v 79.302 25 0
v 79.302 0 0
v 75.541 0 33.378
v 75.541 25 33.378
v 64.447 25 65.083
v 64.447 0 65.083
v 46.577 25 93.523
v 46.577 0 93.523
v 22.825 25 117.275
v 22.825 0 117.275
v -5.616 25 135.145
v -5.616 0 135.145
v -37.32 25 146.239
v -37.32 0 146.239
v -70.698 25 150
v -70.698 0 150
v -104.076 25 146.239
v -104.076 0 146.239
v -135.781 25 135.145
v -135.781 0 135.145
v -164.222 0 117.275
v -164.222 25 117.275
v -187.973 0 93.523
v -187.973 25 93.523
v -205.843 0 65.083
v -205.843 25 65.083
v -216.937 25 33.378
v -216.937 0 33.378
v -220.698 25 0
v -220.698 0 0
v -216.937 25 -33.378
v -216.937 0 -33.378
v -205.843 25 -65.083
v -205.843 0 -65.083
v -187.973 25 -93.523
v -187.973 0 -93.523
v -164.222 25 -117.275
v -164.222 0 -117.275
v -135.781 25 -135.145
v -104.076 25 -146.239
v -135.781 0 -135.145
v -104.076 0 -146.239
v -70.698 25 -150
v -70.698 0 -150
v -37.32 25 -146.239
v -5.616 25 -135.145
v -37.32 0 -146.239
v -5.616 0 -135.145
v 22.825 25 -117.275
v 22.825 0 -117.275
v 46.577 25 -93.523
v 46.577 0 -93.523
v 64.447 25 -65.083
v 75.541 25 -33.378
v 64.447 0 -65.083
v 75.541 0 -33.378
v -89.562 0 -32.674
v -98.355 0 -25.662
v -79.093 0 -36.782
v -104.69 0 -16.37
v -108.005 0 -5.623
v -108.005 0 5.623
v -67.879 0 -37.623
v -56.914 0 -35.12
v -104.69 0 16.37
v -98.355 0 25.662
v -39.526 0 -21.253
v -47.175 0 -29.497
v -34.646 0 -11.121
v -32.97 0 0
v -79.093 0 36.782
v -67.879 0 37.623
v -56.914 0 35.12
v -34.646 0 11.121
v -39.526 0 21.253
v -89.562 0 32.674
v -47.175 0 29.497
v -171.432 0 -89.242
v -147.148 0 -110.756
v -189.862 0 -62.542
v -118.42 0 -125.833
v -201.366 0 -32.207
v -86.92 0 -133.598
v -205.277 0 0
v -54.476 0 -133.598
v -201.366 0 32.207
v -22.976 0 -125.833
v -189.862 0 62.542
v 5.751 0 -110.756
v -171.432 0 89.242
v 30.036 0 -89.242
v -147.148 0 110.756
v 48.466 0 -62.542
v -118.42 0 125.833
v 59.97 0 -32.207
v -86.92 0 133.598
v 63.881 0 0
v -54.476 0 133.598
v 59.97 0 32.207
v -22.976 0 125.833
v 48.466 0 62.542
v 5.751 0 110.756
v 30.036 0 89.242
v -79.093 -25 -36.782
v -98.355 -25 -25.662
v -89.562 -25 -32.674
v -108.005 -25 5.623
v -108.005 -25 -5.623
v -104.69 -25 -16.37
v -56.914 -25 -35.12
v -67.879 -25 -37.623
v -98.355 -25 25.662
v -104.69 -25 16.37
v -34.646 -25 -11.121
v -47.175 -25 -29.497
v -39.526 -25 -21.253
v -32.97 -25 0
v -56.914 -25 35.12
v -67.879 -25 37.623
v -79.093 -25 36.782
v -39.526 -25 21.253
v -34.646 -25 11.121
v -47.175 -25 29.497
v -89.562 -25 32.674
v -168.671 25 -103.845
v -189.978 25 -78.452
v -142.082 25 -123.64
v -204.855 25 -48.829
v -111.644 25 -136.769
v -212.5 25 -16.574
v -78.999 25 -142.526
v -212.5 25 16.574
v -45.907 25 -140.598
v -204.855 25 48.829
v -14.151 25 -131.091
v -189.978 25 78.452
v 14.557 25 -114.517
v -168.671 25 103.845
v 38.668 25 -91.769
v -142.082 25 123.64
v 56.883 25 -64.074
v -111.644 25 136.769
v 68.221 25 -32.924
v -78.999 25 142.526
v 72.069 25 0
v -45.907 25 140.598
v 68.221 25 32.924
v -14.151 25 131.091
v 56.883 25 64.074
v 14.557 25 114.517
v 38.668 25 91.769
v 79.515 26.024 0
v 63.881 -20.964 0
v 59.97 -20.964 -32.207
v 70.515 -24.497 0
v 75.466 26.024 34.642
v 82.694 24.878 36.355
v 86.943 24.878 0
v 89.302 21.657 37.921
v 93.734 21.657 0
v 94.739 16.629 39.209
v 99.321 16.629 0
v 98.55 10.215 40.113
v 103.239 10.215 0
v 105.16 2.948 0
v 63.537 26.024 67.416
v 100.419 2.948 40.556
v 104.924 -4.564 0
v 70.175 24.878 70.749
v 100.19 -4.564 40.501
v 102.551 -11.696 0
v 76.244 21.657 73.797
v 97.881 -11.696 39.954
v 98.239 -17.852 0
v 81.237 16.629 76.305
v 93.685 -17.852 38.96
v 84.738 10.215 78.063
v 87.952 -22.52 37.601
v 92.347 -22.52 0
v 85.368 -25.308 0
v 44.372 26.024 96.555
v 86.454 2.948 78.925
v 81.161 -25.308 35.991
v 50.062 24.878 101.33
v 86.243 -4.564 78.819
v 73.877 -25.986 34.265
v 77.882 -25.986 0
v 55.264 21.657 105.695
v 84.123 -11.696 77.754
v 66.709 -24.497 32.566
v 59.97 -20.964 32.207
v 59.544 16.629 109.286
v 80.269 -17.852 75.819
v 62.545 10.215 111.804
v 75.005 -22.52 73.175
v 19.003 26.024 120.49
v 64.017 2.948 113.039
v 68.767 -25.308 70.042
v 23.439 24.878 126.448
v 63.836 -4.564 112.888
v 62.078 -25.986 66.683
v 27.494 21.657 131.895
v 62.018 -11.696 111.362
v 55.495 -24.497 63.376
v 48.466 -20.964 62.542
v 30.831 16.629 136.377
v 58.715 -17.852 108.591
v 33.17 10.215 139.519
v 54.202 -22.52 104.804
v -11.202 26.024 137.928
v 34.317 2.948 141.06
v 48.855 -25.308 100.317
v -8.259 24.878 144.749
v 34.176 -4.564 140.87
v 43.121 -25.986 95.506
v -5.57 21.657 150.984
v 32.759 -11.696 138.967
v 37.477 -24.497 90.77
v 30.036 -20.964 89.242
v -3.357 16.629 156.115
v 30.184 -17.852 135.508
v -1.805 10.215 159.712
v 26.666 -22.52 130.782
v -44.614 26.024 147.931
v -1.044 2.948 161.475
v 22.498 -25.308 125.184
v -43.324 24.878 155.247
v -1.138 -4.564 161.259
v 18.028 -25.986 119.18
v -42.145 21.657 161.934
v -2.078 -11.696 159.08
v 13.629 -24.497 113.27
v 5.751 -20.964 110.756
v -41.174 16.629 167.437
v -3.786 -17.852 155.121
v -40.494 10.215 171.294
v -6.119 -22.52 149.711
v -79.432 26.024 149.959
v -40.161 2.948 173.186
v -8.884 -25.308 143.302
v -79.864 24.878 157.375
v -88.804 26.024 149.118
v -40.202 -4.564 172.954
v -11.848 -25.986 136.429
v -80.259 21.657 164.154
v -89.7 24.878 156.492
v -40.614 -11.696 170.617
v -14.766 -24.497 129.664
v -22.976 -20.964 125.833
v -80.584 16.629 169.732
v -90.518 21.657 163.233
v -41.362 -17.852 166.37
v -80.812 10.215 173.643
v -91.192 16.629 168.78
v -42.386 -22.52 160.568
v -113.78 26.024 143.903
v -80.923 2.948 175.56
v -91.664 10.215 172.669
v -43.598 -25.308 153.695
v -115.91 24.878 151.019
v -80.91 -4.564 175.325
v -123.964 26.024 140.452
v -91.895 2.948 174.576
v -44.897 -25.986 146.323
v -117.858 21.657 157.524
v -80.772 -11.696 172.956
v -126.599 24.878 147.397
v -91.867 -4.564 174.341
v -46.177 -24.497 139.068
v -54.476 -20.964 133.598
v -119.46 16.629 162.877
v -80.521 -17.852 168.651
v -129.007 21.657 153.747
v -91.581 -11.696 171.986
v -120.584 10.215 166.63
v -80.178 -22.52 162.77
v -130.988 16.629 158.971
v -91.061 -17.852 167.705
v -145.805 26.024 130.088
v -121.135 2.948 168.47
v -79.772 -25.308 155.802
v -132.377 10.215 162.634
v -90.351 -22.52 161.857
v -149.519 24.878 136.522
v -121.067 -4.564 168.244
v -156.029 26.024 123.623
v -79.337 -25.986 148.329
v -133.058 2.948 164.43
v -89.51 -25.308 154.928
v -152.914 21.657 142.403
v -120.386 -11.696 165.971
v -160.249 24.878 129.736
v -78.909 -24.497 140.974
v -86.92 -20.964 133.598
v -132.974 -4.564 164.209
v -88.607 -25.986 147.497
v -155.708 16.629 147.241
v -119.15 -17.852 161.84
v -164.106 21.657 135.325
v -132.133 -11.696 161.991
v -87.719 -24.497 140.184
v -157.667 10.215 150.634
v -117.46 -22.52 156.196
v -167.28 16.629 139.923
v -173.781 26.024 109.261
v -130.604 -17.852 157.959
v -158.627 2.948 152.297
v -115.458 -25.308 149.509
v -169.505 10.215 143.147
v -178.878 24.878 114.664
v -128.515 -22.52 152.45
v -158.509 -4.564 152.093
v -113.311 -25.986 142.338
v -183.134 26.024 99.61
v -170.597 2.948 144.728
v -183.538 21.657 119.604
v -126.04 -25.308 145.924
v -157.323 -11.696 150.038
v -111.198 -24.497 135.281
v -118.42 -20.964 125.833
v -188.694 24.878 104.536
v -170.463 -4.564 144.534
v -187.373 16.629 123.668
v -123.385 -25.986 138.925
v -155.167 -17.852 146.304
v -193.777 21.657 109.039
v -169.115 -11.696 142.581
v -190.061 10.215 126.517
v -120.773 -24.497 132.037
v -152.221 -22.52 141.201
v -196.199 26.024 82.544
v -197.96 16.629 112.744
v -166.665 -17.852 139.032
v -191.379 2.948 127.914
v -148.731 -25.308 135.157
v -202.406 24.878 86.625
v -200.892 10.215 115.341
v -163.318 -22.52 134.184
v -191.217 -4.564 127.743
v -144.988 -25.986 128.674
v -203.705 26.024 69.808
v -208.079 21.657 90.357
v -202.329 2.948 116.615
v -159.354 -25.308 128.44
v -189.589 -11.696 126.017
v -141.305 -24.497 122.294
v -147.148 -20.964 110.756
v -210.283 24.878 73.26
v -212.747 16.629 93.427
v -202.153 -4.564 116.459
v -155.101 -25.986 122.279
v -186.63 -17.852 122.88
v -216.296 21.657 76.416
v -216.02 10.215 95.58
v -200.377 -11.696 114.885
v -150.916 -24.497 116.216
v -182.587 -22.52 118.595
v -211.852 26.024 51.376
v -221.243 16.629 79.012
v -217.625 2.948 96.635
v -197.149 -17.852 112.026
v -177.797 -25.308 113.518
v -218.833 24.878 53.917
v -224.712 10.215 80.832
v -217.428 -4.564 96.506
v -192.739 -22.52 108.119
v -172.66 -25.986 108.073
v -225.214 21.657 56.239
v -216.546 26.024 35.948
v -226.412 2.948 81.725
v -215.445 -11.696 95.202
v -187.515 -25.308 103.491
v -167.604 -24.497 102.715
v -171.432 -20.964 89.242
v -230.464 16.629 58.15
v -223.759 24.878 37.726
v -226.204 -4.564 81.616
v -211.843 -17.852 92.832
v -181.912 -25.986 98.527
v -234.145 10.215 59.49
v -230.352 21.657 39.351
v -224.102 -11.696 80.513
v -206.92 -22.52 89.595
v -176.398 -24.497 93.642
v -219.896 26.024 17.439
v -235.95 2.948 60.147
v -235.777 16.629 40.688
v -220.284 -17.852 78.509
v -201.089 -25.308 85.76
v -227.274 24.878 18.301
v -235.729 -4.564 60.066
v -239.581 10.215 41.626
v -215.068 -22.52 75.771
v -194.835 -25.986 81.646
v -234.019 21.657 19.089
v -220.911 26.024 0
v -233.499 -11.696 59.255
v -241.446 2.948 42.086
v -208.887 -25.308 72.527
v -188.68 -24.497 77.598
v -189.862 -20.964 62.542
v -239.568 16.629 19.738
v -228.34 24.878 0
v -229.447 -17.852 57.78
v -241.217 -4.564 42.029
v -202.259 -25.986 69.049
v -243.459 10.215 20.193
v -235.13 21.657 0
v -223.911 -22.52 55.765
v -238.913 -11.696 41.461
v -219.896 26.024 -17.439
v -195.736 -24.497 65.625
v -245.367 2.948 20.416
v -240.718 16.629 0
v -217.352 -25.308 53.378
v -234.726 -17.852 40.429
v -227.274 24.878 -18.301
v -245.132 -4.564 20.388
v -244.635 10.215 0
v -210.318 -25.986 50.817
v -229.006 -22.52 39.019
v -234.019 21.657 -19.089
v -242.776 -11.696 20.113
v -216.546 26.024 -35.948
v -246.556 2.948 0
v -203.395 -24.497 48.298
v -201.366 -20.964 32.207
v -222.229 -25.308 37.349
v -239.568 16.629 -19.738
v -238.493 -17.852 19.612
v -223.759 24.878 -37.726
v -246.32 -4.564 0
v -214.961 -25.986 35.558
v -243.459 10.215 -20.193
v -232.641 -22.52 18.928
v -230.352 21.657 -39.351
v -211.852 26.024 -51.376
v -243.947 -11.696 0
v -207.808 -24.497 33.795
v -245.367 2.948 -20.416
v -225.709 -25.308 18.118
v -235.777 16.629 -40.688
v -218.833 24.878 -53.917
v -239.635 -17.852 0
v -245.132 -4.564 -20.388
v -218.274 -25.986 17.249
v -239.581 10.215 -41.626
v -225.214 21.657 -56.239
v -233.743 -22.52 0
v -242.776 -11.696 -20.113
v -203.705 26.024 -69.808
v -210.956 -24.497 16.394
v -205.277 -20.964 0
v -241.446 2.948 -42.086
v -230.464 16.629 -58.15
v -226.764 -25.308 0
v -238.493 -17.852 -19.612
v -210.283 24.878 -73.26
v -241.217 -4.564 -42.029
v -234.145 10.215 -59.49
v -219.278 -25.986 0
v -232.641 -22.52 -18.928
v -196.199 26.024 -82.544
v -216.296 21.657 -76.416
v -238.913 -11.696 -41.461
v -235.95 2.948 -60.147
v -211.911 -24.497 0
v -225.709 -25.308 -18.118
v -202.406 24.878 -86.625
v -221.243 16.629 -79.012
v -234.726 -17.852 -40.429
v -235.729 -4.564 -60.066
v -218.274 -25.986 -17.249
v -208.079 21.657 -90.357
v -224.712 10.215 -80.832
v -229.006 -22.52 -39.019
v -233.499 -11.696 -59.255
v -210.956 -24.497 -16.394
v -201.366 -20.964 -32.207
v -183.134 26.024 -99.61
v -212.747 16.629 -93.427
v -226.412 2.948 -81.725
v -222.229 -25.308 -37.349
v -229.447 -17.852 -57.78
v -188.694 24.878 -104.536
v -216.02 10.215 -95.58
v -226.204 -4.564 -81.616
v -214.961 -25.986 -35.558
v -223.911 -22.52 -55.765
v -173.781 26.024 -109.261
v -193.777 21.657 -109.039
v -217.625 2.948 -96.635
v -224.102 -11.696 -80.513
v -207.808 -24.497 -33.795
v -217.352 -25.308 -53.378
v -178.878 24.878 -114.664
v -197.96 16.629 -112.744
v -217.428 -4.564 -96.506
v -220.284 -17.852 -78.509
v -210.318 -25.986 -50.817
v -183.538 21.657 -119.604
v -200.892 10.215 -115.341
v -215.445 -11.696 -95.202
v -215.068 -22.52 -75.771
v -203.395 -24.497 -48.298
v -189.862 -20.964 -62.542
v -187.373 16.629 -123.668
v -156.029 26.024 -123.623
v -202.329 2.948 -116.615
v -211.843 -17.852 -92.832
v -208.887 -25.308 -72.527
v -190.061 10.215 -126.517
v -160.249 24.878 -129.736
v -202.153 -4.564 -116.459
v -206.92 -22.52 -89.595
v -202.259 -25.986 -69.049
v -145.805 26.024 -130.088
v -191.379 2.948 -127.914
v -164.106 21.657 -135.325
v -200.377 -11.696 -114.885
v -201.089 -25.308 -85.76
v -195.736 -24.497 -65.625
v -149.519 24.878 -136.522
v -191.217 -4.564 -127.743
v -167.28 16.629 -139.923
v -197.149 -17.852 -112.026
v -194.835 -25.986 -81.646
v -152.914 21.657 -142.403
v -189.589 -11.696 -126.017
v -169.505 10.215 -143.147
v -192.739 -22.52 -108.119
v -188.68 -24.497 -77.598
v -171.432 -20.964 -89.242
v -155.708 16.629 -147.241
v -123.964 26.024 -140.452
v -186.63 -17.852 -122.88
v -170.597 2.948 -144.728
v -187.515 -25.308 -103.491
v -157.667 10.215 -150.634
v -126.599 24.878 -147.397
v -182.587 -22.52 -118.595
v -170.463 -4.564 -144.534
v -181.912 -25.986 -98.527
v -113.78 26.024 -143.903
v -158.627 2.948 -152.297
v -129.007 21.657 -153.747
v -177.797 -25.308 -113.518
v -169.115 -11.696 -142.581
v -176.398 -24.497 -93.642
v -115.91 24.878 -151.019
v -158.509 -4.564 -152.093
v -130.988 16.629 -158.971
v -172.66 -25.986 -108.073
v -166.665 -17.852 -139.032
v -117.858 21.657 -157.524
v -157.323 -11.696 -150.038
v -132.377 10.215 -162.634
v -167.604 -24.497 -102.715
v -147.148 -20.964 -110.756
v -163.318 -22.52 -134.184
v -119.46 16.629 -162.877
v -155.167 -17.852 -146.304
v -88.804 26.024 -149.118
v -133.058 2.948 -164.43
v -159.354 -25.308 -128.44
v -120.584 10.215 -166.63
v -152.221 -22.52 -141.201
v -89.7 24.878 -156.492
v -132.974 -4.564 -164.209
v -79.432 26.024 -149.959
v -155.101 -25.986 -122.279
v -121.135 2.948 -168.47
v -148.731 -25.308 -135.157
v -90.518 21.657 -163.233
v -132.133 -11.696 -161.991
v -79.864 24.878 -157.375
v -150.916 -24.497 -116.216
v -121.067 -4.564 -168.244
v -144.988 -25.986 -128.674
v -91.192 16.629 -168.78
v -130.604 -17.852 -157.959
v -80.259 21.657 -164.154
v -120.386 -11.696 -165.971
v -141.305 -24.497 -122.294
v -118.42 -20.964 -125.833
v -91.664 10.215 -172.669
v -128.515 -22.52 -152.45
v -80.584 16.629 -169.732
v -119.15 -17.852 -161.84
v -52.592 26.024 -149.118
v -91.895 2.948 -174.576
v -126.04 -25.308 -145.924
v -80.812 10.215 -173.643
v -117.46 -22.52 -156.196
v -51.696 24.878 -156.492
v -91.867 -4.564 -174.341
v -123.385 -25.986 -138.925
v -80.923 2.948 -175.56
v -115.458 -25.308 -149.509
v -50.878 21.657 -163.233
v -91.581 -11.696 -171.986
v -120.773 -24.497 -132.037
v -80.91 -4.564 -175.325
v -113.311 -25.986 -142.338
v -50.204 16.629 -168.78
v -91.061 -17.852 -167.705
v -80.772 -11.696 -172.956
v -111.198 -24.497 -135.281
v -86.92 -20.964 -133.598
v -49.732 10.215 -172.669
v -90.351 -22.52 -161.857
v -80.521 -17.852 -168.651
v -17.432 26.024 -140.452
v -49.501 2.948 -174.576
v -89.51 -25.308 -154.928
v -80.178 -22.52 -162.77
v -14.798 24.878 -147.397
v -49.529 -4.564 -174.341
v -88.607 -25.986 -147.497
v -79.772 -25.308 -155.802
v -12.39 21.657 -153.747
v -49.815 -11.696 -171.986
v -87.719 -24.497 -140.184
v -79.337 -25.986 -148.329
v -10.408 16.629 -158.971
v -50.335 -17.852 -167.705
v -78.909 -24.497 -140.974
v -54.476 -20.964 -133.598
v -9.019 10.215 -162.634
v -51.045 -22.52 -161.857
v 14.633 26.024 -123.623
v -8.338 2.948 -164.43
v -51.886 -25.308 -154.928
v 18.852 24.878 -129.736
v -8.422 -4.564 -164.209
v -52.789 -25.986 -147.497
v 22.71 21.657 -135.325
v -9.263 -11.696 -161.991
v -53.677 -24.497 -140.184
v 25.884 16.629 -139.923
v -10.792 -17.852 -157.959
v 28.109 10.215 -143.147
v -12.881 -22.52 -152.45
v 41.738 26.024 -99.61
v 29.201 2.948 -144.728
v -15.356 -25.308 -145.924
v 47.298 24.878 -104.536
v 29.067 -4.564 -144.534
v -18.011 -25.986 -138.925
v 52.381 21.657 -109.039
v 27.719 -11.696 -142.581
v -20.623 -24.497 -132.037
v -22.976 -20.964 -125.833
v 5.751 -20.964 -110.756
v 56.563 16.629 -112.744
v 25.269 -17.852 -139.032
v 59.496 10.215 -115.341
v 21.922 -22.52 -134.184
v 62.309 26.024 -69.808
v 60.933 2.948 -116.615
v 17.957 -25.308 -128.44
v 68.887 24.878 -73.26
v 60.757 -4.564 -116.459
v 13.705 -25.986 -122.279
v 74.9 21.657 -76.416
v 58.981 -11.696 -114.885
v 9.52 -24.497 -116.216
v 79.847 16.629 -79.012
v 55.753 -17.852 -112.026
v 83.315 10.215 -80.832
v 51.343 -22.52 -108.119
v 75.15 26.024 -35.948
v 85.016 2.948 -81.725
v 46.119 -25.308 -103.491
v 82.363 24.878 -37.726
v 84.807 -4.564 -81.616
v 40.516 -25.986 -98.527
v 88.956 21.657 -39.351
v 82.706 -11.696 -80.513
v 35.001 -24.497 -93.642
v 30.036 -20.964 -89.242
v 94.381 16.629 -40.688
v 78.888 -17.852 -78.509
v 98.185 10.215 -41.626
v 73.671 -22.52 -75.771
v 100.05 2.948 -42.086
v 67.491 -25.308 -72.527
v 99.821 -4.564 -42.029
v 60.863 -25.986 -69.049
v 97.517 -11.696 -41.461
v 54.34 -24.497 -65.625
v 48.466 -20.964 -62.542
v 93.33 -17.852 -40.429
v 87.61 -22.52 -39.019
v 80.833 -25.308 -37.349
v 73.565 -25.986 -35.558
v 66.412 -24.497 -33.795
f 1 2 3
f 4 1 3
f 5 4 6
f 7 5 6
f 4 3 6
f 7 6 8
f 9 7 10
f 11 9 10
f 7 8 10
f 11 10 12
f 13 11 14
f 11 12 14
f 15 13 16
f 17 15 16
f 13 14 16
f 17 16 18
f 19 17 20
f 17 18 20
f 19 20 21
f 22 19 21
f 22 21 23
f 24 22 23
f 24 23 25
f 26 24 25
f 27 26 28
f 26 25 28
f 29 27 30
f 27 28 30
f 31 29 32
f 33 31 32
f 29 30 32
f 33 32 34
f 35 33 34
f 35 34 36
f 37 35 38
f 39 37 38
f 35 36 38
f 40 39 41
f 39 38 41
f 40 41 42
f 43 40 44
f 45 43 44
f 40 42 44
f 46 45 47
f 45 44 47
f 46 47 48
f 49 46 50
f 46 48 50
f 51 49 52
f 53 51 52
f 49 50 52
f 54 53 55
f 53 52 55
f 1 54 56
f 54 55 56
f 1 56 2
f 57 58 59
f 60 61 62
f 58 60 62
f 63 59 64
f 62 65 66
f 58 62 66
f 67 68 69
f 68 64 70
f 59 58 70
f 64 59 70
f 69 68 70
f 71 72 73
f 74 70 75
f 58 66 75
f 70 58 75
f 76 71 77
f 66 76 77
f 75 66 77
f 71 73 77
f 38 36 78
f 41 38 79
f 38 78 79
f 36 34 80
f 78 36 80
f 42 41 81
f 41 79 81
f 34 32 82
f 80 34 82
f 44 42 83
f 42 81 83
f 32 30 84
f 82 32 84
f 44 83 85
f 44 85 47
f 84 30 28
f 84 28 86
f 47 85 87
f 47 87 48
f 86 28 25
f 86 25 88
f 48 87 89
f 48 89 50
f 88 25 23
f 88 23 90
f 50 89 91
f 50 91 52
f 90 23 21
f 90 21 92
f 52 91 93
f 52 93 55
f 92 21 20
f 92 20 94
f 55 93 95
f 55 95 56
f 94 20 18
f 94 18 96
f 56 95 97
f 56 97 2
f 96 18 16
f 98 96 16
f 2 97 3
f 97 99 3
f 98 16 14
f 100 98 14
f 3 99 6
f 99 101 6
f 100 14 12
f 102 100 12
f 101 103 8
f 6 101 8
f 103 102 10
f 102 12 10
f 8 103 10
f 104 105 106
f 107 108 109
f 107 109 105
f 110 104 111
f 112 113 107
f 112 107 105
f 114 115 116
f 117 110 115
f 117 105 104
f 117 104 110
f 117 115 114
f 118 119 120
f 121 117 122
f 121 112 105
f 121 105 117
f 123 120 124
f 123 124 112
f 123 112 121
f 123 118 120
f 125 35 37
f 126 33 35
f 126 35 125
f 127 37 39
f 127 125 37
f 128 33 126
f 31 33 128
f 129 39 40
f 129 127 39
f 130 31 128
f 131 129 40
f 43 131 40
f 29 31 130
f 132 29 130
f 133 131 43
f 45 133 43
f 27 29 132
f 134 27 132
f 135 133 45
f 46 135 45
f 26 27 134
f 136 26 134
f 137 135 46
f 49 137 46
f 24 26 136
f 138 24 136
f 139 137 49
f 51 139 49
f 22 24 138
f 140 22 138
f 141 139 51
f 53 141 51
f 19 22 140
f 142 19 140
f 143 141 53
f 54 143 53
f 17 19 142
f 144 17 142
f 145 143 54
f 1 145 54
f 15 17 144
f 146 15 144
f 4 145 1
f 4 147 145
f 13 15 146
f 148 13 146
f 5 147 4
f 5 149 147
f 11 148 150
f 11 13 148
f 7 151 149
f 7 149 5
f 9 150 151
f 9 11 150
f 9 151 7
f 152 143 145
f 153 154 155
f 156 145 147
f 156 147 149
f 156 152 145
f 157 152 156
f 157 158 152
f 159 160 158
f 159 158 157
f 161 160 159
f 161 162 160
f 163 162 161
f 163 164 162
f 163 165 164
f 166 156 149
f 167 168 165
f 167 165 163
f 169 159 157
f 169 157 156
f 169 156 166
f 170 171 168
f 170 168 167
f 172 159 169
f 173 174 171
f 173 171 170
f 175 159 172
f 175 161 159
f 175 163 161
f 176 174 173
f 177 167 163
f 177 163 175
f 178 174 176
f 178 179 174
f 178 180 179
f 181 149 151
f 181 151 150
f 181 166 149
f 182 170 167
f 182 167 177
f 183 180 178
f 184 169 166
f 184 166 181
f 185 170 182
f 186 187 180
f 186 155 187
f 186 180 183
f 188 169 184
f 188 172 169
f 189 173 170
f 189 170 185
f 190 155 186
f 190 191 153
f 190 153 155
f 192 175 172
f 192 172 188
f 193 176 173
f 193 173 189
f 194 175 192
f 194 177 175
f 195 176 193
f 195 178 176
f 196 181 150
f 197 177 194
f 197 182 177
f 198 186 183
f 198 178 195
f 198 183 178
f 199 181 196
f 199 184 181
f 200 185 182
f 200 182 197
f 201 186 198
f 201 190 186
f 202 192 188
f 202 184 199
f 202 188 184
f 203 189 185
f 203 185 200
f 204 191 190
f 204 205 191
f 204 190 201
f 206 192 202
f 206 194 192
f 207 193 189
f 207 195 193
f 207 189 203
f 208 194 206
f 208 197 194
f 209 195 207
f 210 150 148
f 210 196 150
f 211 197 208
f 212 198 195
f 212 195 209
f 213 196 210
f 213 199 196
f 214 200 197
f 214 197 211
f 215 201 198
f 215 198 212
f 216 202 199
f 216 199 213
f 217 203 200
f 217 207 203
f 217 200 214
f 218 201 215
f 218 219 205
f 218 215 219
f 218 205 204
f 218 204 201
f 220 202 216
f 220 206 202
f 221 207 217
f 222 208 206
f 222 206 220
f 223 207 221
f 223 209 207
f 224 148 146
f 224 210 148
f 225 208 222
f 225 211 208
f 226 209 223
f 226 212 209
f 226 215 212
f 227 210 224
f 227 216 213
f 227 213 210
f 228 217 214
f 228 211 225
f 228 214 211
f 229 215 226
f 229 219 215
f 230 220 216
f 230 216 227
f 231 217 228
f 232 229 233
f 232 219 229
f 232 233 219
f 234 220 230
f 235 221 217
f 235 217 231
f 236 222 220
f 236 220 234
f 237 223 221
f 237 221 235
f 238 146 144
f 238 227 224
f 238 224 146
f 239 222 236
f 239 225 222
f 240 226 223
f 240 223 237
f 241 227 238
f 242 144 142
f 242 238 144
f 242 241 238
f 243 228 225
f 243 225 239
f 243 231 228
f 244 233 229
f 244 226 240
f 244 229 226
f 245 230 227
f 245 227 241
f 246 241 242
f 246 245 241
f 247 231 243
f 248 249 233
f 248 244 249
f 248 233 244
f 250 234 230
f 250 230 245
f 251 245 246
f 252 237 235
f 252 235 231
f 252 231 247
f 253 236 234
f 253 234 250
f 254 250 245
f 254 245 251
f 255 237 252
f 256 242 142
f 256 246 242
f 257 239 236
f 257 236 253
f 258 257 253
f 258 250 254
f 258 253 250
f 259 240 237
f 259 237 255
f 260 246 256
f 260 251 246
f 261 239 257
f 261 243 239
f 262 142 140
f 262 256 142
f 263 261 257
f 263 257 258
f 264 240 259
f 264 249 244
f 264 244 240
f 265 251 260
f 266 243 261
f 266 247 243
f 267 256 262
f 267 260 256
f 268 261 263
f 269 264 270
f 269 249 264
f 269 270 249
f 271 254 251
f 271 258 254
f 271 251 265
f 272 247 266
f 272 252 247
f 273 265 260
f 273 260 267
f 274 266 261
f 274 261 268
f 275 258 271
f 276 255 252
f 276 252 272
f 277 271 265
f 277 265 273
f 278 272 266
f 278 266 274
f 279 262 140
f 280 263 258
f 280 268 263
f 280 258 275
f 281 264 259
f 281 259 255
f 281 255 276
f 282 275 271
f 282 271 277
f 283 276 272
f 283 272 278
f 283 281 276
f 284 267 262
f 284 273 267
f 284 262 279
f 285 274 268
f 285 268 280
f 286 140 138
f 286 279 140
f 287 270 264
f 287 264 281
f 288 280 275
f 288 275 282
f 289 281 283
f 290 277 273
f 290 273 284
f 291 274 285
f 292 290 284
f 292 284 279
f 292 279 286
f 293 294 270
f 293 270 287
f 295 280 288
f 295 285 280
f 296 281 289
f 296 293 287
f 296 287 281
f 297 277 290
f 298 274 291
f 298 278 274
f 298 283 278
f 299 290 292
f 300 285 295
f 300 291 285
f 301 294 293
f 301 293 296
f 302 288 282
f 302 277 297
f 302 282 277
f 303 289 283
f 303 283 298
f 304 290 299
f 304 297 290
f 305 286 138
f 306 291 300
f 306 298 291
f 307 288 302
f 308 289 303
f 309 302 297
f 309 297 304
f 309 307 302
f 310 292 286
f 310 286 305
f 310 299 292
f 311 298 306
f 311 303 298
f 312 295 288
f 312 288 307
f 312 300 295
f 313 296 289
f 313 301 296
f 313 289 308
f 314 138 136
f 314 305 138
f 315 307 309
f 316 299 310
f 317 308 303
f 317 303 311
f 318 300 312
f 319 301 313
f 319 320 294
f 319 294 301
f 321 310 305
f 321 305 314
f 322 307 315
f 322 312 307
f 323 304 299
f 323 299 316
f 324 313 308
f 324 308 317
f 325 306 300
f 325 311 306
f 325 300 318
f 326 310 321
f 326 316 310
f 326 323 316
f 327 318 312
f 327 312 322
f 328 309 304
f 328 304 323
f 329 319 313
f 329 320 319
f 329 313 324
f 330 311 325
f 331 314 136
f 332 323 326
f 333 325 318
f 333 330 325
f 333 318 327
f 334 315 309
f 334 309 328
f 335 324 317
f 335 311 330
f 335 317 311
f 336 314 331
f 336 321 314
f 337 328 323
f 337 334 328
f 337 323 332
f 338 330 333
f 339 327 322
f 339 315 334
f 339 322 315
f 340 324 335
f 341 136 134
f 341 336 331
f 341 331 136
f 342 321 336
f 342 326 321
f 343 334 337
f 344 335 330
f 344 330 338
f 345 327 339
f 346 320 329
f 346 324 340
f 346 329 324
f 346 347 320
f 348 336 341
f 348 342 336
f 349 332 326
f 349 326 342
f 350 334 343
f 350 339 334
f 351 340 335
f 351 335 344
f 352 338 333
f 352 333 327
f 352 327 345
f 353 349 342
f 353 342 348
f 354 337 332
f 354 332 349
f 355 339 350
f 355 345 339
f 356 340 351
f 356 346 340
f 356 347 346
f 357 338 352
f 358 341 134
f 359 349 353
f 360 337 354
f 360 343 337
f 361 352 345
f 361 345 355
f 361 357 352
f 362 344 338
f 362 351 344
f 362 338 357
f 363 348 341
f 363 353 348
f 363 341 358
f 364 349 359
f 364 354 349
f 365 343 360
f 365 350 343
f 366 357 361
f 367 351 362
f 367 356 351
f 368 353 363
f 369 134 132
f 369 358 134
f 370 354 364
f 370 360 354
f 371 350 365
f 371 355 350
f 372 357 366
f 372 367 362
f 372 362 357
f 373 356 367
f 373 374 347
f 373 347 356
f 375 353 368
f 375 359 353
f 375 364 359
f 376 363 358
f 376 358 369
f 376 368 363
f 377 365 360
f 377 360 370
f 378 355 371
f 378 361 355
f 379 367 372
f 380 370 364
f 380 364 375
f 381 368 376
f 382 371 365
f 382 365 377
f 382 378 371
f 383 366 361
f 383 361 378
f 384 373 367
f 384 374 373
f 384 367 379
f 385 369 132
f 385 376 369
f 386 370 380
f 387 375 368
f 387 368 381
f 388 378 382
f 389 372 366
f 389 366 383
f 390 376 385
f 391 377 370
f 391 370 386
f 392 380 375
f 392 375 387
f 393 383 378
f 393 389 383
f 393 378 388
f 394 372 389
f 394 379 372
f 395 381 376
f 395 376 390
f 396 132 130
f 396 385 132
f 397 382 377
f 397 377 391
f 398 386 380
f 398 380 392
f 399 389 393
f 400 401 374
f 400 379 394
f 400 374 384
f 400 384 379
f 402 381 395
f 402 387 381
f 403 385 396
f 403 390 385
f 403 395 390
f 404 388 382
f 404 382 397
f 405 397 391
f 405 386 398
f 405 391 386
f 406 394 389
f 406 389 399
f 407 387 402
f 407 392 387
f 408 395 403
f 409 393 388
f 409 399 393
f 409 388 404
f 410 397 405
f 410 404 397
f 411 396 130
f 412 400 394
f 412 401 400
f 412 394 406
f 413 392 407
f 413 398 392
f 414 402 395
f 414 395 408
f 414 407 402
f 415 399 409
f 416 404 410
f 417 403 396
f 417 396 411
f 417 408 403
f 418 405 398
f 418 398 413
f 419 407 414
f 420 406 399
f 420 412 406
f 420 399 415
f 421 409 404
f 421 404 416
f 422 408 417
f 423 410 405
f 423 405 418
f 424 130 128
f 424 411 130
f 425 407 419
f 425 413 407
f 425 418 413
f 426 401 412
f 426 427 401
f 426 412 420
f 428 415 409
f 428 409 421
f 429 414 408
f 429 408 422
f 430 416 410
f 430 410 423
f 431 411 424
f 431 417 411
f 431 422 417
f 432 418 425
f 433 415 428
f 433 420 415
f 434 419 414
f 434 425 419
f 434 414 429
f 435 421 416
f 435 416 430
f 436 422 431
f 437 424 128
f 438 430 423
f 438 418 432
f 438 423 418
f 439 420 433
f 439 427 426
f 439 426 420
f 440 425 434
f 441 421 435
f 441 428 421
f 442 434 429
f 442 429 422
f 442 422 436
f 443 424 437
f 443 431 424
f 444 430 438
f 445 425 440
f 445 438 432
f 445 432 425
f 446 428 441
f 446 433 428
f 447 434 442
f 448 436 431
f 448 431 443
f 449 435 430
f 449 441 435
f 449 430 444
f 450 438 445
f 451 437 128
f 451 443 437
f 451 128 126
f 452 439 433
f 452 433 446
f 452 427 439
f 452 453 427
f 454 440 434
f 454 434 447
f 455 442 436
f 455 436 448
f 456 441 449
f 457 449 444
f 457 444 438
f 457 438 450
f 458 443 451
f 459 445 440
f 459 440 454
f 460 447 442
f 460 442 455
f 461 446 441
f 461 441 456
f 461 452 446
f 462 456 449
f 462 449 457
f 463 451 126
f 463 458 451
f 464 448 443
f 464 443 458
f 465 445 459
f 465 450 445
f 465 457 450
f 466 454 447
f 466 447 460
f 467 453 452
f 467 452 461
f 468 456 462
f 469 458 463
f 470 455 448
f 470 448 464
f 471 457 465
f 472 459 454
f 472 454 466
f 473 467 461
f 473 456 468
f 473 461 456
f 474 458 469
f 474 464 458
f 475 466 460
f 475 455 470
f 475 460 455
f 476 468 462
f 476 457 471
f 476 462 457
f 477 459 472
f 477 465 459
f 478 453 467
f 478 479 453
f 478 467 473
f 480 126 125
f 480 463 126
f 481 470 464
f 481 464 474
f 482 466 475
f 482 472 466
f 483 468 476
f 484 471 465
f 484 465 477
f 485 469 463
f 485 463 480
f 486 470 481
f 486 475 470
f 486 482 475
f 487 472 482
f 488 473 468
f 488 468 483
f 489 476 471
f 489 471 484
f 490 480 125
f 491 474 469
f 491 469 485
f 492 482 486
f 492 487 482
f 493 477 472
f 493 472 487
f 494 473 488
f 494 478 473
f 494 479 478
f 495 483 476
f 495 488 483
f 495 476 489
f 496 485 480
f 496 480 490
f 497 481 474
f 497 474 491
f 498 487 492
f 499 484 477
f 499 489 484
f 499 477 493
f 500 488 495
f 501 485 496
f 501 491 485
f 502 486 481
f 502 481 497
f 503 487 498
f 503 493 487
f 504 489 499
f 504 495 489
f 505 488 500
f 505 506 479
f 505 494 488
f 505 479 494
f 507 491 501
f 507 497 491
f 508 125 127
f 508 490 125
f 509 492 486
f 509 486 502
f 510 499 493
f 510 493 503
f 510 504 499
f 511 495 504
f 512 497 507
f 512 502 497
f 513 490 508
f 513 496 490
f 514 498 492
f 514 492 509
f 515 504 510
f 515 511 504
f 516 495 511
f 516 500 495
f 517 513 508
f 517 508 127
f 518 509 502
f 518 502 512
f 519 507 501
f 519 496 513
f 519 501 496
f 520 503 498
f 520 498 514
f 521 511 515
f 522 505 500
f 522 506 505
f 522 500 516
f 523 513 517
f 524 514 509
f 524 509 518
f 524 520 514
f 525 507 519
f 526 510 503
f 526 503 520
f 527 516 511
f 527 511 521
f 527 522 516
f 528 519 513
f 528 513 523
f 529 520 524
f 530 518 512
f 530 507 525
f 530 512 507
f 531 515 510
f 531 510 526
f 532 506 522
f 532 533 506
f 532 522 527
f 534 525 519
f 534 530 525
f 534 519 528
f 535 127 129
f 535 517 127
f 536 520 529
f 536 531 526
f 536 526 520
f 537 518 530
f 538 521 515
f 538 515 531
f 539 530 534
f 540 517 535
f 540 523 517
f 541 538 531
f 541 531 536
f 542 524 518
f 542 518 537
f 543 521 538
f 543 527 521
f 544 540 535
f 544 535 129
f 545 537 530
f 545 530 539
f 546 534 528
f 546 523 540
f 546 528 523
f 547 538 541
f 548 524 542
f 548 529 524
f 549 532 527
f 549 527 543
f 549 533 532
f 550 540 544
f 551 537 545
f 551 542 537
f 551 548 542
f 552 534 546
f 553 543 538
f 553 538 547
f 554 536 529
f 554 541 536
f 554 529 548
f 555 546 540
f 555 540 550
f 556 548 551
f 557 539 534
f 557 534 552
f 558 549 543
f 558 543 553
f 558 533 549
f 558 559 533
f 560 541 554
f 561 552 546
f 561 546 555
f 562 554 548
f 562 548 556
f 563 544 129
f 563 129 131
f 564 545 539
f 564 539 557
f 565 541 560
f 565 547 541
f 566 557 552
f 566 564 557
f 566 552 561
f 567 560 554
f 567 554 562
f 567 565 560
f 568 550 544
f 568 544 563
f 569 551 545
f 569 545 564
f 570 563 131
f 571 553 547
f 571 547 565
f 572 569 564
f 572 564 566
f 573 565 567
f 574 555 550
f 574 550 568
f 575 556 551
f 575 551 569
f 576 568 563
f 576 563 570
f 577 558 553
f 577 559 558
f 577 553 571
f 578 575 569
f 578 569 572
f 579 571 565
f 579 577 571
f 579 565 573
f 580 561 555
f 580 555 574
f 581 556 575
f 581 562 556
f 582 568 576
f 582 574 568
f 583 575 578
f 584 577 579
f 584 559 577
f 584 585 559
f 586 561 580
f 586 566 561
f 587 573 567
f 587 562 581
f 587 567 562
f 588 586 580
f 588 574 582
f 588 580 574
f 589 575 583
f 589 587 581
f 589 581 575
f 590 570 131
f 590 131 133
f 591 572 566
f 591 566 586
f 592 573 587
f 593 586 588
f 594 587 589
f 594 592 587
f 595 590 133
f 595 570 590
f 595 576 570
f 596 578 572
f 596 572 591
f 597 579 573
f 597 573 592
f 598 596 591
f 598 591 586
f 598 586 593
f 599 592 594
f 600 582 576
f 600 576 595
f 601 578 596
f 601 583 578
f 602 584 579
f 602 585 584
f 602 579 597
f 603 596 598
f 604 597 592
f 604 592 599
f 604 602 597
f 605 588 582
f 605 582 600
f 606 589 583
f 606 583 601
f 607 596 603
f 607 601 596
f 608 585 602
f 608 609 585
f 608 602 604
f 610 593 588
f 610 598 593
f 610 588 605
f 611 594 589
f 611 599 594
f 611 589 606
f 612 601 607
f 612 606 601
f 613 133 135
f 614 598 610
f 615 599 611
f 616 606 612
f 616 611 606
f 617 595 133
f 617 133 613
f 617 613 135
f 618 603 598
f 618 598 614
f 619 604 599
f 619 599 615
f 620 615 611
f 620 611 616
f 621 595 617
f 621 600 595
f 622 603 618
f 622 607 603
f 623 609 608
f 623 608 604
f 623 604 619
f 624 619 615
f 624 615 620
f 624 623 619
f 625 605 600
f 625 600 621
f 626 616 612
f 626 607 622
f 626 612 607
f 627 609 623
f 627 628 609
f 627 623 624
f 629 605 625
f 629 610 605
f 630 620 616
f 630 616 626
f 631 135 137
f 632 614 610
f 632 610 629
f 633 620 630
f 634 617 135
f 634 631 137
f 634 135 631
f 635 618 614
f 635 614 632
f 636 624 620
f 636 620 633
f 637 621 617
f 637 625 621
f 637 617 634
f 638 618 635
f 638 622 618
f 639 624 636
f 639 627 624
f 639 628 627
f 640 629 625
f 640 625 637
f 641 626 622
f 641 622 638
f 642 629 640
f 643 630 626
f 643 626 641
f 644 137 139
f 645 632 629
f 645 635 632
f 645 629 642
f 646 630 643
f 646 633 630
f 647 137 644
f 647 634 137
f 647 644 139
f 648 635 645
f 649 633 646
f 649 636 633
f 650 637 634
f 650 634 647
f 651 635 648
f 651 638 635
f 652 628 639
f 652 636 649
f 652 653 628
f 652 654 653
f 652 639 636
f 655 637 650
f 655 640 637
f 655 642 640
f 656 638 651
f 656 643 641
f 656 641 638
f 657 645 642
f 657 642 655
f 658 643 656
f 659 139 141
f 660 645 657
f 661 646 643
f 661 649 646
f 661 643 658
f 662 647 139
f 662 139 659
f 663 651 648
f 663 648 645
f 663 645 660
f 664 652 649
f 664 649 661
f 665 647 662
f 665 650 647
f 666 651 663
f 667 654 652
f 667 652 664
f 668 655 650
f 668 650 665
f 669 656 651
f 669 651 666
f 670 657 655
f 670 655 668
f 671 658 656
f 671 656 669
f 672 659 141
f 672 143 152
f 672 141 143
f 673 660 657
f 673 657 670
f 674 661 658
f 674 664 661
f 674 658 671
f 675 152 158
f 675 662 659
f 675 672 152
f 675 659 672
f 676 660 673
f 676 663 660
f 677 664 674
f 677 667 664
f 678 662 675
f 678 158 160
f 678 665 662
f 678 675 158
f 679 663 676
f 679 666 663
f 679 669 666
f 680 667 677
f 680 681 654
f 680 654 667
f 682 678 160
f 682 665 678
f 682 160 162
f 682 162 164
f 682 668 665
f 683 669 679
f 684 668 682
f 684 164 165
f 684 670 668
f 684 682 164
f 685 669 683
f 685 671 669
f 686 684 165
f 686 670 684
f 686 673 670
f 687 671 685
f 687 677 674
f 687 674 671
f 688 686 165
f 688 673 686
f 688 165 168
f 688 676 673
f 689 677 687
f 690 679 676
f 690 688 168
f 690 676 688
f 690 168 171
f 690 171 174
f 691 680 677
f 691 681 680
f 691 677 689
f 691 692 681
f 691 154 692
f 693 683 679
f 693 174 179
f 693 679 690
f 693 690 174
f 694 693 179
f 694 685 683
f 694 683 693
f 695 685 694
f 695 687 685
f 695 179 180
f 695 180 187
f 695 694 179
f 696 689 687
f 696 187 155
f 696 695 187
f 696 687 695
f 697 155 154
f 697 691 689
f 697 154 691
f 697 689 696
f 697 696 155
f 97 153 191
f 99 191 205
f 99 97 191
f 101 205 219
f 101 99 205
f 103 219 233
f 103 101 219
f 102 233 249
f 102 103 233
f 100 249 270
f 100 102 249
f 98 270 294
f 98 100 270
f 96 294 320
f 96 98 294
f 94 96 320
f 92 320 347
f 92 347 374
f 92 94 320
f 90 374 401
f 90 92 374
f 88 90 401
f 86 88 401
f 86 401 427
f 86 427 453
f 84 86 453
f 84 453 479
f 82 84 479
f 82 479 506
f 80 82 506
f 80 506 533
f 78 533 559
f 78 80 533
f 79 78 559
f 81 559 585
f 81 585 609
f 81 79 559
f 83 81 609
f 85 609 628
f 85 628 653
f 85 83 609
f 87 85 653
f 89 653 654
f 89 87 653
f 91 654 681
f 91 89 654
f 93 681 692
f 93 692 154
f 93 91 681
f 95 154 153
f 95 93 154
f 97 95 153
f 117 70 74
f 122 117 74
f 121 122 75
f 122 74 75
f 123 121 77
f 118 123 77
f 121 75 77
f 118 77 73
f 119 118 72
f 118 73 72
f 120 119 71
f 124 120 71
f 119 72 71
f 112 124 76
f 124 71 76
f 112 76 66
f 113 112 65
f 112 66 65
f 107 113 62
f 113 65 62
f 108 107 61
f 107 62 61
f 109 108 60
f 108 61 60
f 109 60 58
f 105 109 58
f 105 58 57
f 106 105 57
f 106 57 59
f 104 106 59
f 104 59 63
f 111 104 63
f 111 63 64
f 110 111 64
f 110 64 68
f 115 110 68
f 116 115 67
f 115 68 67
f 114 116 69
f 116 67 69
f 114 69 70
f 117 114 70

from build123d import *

# Parameters (mm, degrees)
F1_R     = 9.2512035182
F4_R     = 150
F4_R_2   = 37.7282385667
F7_DEPTH = 25
F8_DEPTH = 25


with BuildPart() as f2:
    # F2: sweep along a path in F0
    with BuildLine(Plane.XZ) as f2_path:
        ThreePointArc((-53.8952867203, 15.9109570086), (0, -56.1948439235), (53.8952867203, 15.9109570086))
    # F1 (on Top) → F2 (sweep)
    with BuildSketch(Plane.XY):
        with Locations((-56.1948439235, 0)):
            Circle(F1_R)
    sweep(path=f2_path.line)


with BuildPart() as f6:
    # F6: sweep along a path in F4
    with BuildLine(Plane.XZ) as f6_path:
        CenterArc((-70.6980675459, 0), 150, 0, 360)
    # F5 (on Top) → F6 (sweep)
    with BuildSketch(Plane.XY):
        with BuildLine():
            Line((-205.2769718125, -20.9643404032), (-205.2769718125, 20.9643404032))
            ThreePointArc((-205.2769718125, 20.9643404032), (-246.7233199397, 0), (-205.2769718125, -20.9643404032))
        make_face()
    sweep(path=f6_path.line)

    # F4 (on Front) → F7 (cut)
    with BuildSketch(Plane.XZ):
        with Locations((-70.6980675459, 0)):
            Circle(F4_R)
        with Locations((-70.6980675459, 0)):
            Circle(F4_R_2, mode=Mode.SUBTRACT)
    extrude(amount=-F7_DEPTH, mode=Mode.SUBTRACT)


with BuildPart() as f8:
    # F4 (on Front) → F8 (new body)
    with BuildSketch(Plane.XZ):
        with Locations((-70.6980675459, 0)):
            Circle(F4_R_2)
    extrude(amount=F8_DEPTH)


solid = Compound([f6.part, f8.part])
